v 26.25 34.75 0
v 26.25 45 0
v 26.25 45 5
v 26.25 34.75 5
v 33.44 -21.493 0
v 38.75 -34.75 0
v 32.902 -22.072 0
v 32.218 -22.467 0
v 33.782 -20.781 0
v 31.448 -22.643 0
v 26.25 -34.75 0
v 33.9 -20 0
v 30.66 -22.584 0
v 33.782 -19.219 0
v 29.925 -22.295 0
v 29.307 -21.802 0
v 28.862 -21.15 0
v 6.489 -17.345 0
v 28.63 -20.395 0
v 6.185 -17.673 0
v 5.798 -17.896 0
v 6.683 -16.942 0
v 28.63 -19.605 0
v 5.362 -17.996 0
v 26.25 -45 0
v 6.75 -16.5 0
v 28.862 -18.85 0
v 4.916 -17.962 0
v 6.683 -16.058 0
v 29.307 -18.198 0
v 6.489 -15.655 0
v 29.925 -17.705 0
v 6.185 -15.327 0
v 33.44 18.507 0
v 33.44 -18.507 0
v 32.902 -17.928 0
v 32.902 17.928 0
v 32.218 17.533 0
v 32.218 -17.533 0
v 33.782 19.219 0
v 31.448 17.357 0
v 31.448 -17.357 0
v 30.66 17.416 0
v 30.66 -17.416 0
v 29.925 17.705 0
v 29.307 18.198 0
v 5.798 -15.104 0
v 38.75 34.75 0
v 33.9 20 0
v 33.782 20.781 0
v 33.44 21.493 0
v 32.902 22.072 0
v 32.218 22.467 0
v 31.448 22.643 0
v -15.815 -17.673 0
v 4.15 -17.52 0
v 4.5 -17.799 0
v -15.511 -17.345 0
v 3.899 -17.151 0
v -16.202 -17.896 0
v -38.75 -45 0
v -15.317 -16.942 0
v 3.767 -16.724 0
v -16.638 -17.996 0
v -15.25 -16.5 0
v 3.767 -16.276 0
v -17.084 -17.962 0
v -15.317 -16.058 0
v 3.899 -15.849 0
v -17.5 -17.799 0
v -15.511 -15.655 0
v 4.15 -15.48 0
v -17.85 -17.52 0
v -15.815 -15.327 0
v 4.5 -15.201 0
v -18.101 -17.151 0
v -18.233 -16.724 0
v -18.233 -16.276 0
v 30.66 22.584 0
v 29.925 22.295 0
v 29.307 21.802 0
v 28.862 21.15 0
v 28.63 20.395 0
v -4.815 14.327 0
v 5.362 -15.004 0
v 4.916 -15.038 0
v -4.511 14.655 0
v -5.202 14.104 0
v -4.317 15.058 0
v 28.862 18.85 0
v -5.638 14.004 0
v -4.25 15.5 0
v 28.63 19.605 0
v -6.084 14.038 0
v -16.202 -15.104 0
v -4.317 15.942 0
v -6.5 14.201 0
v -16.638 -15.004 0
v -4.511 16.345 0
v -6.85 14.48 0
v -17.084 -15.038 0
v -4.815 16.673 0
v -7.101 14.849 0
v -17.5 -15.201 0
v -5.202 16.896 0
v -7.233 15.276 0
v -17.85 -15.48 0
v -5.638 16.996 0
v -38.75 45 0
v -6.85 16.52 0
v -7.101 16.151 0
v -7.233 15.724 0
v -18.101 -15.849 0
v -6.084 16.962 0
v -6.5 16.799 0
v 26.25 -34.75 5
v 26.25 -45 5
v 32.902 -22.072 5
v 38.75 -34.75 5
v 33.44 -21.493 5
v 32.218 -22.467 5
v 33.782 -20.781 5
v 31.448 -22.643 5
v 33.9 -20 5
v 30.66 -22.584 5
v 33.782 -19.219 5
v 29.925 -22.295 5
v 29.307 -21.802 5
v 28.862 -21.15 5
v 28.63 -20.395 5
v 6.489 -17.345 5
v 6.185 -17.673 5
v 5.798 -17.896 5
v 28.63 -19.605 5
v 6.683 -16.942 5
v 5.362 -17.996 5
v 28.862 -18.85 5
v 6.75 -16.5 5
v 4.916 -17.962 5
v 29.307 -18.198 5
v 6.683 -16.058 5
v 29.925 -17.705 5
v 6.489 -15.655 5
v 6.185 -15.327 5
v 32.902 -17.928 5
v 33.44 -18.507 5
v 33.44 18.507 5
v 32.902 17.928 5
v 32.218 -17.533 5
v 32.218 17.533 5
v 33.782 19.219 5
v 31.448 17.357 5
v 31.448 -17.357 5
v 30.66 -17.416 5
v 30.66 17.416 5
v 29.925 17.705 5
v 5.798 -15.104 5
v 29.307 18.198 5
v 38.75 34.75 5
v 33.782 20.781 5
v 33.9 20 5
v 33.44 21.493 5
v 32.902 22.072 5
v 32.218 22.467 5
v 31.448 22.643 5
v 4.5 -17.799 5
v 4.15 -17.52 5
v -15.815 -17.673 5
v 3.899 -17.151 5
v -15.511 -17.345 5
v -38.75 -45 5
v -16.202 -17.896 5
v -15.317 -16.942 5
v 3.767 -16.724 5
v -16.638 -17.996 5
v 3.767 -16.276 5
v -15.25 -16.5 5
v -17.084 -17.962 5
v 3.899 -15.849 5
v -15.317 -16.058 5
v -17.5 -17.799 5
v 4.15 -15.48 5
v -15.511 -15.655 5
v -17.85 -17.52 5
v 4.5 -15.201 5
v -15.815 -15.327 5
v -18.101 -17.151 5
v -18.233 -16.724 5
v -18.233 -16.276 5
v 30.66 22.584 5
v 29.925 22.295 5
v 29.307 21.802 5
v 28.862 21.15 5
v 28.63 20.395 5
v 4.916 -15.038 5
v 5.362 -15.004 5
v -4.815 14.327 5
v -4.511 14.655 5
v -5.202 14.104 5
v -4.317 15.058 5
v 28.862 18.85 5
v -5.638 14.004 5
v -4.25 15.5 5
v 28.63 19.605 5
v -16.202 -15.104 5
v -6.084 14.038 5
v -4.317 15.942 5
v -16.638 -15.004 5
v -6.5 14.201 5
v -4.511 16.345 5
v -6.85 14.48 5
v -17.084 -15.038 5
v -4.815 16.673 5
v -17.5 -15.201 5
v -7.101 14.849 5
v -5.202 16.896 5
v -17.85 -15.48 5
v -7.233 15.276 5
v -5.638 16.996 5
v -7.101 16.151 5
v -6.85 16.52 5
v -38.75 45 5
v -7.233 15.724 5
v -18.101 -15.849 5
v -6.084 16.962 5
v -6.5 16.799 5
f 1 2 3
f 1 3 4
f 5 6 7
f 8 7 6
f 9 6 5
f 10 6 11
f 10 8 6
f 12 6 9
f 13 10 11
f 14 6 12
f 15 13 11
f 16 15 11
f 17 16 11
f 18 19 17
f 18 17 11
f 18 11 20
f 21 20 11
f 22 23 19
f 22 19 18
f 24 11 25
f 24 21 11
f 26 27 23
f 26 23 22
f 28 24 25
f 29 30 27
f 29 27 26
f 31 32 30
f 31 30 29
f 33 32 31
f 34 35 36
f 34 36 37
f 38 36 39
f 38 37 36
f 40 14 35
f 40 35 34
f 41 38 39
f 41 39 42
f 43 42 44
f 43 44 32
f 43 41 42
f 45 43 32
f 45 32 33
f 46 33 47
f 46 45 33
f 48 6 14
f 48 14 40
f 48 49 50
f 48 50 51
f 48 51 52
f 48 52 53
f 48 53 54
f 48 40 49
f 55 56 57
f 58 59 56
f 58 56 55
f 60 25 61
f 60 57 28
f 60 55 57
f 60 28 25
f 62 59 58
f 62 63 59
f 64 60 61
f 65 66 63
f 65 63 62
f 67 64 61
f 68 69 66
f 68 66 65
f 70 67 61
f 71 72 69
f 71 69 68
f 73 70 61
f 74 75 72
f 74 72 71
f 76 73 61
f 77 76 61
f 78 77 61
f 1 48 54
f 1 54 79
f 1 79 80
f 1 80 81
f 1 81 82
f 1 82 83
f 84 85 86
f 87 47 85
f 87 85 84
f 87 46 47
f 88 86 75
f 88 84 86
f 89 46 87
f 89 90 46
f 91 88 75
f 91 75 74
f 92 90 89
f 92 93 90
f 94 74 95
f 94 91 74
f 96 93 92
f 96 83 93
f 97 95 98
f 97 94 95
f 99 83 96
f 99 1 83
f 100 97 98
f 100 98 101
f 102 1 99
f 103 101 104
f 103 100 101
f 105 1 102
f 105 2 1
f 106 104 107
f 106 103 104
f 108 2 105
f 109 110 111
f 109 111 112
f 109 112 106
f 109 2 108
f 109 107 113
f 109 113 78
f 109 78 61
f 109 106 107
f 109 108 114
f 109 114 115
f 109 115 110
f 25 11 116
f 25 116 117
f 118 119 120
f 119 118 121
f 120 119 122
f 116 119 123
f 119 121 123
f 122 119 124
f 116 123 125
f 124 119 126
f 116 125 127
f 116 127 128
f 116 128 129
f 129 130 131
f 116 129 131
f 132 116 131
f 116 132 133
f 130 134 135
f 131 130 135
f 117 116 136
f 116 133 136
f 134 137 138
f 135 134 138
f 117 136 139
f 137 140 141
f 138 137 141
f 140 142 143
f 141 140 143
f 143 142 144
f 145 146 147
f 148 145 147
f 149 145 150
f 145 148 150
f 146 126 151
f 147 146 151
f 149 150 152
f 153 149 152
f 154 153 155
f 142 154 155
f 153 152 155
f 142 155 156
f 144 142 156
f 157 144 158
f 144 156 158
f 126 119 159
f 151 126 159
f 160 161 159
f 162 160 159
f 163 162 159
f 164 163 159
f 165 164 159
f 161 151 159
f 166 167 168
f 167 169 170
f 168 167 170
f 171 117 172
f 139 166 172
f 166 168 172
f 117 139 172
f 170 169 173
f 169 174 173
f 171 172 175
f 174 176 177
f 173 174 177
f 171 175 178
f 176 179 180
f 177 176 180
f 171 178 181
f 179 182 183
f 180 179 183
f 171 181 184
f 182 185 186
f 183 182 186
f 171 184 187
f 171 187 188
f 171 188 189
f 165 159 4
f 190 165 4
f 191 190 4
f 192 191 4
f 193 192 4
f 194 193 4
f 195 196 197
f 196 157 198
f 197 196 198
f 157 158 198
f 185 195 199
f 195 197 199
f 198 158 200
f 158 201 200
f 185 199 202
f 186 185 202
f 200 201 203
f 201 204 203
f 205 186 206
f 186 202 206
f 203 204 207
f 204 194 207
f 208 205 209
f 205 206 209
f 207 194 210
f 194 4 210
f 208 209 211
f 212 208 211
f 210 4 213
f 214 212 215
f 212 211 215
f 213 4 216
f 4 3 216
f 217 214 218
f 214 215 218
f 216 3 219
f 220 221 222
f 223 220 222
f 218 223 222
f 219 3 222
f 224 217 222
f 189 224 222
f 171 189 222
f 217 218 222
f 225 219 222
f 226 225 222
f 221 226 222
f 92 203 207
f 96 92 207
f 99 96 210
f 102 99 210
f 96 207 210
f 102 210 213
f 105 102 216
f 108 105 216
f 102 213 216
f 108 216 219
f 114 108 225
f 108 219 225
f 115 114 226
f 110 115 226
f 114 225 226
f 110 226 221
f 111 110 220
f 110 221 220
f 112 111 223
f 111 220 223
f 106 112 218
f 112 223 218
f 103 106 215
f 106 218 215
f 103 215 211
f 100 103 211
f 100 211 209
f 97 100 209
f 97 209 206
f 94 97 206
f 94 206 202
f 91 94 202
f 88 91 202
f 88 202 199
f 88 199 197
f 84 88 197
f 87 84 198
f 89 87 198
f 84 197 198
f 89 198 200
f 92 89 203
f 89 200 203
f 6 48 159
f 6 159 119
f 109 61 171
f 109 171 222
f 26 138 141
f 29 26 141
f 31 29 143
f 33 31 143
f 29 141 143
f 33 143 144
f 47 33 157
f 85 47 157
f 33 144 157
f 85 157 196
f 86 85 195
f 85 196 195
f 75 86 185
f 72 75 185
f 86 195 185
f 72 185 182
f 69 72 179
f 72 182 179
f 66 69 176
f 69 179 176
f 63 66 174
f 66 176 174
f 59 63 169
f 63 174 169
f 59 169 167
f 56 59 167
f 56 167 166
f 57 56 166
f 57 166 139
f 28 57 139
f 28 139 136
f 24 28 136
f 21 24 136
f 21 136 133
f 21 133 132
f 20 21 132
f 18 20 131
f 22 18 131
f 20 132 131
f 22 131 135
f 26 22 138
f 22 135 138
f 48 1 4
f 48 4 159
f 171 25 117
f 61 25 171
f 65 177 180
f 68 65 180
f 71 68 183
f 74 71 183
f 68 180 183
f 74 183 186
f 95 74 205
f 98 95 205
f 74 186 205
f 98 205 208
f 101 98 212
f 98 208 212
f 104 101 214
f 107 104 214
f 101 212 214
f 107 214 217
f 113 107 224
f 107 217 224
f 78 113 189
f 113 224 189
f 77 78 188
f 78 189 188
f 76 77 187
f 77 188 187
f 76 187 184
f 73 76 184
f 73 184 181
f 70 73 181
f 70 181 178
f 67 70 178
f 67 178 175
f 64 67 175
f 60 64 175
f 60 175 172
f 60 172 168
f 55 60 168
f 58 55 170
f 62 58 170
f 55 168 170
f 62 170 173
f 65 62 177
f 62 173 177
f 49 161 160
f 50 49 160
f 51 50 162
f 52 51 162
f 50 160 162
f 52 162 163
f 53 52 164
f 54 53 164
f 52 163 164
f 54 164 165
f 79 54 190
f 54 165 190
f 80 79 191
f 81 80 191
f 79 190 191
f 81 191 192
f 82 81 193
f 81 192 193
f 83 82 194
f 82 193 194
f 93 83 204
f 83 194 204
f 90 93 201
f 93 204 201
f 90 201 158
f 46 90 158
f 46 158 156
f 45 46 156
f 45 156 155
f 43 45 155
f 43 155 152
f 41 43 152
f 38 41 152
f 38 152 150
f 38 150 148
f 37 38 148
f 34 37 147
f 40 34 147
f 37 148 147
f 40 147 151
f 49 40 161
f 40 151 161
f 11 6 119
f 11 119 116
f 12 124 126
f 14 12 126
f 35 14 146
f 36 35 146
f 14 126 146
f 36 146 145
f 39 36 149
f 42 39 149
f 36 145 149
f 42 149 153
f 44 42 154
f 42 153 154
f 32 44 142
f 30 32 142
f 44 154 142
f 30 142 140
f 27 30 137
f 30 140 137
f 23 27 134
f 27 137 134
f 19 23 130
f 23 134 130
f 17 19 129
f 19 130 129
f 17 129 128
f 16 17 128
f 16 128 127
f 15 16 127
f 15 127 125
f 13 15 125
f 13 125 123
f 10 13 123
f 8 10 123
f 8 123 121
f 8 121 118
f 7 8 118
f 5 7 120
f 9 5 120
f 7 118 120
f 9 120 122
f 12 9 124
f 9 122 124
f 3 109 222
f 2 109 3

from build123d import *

# Parameters (mm, degrees)
PAD_DEPTH       = 5
SKETCH001_R     = 2.65
POCKET_DEPTH    = 5
SKETCH002_R     = 1.5
POCKET001_DEPTH = 5


with BuildPart() as part:
    # Sketch → Pad (new body)
    with BuildSketch(Plane.XY):
        Polygon((38.75, 34.75), (38.75, -34.75), (26.25, -34.75), (26.25, -45), (-38.75, -45), (-38.75, 45), (26.25, 45), (26.25, 34.75), align=None)
    extrude(amount=PAD_DEPTH)

    # Sketch001 (on Face10 of Pad) → Pocket (cut)
    with BuildSketch(Plane.XY.offset(5)):
        with Locations((31.25, 20)):
            Circle(SKETCH001_R)
        with Locations((31.25, -20)):
            Circle(SKETCH001_R)
    extrude(amount=-POCKET_DEPTH, mode=Mode.SUBTRACT)

    # Sketch002 (on Face5 of Pocket) → Pocket001 (cut)
    with BuildSketch(Plane.XY.offset(5)):
        with Locations((5.25, -16.5)):
            Circle(SKETCH002_R)
        with Locations((-16.75, -16.5)):
            Circle(SKETCH002_R)
        with Locations((-5.75, 15.5)):
            Circle(SKETCH002_R)
    extrude(amount=-POCKET001_DEPTH, mode=Mode.SUBTRACT)


solid = part.part
